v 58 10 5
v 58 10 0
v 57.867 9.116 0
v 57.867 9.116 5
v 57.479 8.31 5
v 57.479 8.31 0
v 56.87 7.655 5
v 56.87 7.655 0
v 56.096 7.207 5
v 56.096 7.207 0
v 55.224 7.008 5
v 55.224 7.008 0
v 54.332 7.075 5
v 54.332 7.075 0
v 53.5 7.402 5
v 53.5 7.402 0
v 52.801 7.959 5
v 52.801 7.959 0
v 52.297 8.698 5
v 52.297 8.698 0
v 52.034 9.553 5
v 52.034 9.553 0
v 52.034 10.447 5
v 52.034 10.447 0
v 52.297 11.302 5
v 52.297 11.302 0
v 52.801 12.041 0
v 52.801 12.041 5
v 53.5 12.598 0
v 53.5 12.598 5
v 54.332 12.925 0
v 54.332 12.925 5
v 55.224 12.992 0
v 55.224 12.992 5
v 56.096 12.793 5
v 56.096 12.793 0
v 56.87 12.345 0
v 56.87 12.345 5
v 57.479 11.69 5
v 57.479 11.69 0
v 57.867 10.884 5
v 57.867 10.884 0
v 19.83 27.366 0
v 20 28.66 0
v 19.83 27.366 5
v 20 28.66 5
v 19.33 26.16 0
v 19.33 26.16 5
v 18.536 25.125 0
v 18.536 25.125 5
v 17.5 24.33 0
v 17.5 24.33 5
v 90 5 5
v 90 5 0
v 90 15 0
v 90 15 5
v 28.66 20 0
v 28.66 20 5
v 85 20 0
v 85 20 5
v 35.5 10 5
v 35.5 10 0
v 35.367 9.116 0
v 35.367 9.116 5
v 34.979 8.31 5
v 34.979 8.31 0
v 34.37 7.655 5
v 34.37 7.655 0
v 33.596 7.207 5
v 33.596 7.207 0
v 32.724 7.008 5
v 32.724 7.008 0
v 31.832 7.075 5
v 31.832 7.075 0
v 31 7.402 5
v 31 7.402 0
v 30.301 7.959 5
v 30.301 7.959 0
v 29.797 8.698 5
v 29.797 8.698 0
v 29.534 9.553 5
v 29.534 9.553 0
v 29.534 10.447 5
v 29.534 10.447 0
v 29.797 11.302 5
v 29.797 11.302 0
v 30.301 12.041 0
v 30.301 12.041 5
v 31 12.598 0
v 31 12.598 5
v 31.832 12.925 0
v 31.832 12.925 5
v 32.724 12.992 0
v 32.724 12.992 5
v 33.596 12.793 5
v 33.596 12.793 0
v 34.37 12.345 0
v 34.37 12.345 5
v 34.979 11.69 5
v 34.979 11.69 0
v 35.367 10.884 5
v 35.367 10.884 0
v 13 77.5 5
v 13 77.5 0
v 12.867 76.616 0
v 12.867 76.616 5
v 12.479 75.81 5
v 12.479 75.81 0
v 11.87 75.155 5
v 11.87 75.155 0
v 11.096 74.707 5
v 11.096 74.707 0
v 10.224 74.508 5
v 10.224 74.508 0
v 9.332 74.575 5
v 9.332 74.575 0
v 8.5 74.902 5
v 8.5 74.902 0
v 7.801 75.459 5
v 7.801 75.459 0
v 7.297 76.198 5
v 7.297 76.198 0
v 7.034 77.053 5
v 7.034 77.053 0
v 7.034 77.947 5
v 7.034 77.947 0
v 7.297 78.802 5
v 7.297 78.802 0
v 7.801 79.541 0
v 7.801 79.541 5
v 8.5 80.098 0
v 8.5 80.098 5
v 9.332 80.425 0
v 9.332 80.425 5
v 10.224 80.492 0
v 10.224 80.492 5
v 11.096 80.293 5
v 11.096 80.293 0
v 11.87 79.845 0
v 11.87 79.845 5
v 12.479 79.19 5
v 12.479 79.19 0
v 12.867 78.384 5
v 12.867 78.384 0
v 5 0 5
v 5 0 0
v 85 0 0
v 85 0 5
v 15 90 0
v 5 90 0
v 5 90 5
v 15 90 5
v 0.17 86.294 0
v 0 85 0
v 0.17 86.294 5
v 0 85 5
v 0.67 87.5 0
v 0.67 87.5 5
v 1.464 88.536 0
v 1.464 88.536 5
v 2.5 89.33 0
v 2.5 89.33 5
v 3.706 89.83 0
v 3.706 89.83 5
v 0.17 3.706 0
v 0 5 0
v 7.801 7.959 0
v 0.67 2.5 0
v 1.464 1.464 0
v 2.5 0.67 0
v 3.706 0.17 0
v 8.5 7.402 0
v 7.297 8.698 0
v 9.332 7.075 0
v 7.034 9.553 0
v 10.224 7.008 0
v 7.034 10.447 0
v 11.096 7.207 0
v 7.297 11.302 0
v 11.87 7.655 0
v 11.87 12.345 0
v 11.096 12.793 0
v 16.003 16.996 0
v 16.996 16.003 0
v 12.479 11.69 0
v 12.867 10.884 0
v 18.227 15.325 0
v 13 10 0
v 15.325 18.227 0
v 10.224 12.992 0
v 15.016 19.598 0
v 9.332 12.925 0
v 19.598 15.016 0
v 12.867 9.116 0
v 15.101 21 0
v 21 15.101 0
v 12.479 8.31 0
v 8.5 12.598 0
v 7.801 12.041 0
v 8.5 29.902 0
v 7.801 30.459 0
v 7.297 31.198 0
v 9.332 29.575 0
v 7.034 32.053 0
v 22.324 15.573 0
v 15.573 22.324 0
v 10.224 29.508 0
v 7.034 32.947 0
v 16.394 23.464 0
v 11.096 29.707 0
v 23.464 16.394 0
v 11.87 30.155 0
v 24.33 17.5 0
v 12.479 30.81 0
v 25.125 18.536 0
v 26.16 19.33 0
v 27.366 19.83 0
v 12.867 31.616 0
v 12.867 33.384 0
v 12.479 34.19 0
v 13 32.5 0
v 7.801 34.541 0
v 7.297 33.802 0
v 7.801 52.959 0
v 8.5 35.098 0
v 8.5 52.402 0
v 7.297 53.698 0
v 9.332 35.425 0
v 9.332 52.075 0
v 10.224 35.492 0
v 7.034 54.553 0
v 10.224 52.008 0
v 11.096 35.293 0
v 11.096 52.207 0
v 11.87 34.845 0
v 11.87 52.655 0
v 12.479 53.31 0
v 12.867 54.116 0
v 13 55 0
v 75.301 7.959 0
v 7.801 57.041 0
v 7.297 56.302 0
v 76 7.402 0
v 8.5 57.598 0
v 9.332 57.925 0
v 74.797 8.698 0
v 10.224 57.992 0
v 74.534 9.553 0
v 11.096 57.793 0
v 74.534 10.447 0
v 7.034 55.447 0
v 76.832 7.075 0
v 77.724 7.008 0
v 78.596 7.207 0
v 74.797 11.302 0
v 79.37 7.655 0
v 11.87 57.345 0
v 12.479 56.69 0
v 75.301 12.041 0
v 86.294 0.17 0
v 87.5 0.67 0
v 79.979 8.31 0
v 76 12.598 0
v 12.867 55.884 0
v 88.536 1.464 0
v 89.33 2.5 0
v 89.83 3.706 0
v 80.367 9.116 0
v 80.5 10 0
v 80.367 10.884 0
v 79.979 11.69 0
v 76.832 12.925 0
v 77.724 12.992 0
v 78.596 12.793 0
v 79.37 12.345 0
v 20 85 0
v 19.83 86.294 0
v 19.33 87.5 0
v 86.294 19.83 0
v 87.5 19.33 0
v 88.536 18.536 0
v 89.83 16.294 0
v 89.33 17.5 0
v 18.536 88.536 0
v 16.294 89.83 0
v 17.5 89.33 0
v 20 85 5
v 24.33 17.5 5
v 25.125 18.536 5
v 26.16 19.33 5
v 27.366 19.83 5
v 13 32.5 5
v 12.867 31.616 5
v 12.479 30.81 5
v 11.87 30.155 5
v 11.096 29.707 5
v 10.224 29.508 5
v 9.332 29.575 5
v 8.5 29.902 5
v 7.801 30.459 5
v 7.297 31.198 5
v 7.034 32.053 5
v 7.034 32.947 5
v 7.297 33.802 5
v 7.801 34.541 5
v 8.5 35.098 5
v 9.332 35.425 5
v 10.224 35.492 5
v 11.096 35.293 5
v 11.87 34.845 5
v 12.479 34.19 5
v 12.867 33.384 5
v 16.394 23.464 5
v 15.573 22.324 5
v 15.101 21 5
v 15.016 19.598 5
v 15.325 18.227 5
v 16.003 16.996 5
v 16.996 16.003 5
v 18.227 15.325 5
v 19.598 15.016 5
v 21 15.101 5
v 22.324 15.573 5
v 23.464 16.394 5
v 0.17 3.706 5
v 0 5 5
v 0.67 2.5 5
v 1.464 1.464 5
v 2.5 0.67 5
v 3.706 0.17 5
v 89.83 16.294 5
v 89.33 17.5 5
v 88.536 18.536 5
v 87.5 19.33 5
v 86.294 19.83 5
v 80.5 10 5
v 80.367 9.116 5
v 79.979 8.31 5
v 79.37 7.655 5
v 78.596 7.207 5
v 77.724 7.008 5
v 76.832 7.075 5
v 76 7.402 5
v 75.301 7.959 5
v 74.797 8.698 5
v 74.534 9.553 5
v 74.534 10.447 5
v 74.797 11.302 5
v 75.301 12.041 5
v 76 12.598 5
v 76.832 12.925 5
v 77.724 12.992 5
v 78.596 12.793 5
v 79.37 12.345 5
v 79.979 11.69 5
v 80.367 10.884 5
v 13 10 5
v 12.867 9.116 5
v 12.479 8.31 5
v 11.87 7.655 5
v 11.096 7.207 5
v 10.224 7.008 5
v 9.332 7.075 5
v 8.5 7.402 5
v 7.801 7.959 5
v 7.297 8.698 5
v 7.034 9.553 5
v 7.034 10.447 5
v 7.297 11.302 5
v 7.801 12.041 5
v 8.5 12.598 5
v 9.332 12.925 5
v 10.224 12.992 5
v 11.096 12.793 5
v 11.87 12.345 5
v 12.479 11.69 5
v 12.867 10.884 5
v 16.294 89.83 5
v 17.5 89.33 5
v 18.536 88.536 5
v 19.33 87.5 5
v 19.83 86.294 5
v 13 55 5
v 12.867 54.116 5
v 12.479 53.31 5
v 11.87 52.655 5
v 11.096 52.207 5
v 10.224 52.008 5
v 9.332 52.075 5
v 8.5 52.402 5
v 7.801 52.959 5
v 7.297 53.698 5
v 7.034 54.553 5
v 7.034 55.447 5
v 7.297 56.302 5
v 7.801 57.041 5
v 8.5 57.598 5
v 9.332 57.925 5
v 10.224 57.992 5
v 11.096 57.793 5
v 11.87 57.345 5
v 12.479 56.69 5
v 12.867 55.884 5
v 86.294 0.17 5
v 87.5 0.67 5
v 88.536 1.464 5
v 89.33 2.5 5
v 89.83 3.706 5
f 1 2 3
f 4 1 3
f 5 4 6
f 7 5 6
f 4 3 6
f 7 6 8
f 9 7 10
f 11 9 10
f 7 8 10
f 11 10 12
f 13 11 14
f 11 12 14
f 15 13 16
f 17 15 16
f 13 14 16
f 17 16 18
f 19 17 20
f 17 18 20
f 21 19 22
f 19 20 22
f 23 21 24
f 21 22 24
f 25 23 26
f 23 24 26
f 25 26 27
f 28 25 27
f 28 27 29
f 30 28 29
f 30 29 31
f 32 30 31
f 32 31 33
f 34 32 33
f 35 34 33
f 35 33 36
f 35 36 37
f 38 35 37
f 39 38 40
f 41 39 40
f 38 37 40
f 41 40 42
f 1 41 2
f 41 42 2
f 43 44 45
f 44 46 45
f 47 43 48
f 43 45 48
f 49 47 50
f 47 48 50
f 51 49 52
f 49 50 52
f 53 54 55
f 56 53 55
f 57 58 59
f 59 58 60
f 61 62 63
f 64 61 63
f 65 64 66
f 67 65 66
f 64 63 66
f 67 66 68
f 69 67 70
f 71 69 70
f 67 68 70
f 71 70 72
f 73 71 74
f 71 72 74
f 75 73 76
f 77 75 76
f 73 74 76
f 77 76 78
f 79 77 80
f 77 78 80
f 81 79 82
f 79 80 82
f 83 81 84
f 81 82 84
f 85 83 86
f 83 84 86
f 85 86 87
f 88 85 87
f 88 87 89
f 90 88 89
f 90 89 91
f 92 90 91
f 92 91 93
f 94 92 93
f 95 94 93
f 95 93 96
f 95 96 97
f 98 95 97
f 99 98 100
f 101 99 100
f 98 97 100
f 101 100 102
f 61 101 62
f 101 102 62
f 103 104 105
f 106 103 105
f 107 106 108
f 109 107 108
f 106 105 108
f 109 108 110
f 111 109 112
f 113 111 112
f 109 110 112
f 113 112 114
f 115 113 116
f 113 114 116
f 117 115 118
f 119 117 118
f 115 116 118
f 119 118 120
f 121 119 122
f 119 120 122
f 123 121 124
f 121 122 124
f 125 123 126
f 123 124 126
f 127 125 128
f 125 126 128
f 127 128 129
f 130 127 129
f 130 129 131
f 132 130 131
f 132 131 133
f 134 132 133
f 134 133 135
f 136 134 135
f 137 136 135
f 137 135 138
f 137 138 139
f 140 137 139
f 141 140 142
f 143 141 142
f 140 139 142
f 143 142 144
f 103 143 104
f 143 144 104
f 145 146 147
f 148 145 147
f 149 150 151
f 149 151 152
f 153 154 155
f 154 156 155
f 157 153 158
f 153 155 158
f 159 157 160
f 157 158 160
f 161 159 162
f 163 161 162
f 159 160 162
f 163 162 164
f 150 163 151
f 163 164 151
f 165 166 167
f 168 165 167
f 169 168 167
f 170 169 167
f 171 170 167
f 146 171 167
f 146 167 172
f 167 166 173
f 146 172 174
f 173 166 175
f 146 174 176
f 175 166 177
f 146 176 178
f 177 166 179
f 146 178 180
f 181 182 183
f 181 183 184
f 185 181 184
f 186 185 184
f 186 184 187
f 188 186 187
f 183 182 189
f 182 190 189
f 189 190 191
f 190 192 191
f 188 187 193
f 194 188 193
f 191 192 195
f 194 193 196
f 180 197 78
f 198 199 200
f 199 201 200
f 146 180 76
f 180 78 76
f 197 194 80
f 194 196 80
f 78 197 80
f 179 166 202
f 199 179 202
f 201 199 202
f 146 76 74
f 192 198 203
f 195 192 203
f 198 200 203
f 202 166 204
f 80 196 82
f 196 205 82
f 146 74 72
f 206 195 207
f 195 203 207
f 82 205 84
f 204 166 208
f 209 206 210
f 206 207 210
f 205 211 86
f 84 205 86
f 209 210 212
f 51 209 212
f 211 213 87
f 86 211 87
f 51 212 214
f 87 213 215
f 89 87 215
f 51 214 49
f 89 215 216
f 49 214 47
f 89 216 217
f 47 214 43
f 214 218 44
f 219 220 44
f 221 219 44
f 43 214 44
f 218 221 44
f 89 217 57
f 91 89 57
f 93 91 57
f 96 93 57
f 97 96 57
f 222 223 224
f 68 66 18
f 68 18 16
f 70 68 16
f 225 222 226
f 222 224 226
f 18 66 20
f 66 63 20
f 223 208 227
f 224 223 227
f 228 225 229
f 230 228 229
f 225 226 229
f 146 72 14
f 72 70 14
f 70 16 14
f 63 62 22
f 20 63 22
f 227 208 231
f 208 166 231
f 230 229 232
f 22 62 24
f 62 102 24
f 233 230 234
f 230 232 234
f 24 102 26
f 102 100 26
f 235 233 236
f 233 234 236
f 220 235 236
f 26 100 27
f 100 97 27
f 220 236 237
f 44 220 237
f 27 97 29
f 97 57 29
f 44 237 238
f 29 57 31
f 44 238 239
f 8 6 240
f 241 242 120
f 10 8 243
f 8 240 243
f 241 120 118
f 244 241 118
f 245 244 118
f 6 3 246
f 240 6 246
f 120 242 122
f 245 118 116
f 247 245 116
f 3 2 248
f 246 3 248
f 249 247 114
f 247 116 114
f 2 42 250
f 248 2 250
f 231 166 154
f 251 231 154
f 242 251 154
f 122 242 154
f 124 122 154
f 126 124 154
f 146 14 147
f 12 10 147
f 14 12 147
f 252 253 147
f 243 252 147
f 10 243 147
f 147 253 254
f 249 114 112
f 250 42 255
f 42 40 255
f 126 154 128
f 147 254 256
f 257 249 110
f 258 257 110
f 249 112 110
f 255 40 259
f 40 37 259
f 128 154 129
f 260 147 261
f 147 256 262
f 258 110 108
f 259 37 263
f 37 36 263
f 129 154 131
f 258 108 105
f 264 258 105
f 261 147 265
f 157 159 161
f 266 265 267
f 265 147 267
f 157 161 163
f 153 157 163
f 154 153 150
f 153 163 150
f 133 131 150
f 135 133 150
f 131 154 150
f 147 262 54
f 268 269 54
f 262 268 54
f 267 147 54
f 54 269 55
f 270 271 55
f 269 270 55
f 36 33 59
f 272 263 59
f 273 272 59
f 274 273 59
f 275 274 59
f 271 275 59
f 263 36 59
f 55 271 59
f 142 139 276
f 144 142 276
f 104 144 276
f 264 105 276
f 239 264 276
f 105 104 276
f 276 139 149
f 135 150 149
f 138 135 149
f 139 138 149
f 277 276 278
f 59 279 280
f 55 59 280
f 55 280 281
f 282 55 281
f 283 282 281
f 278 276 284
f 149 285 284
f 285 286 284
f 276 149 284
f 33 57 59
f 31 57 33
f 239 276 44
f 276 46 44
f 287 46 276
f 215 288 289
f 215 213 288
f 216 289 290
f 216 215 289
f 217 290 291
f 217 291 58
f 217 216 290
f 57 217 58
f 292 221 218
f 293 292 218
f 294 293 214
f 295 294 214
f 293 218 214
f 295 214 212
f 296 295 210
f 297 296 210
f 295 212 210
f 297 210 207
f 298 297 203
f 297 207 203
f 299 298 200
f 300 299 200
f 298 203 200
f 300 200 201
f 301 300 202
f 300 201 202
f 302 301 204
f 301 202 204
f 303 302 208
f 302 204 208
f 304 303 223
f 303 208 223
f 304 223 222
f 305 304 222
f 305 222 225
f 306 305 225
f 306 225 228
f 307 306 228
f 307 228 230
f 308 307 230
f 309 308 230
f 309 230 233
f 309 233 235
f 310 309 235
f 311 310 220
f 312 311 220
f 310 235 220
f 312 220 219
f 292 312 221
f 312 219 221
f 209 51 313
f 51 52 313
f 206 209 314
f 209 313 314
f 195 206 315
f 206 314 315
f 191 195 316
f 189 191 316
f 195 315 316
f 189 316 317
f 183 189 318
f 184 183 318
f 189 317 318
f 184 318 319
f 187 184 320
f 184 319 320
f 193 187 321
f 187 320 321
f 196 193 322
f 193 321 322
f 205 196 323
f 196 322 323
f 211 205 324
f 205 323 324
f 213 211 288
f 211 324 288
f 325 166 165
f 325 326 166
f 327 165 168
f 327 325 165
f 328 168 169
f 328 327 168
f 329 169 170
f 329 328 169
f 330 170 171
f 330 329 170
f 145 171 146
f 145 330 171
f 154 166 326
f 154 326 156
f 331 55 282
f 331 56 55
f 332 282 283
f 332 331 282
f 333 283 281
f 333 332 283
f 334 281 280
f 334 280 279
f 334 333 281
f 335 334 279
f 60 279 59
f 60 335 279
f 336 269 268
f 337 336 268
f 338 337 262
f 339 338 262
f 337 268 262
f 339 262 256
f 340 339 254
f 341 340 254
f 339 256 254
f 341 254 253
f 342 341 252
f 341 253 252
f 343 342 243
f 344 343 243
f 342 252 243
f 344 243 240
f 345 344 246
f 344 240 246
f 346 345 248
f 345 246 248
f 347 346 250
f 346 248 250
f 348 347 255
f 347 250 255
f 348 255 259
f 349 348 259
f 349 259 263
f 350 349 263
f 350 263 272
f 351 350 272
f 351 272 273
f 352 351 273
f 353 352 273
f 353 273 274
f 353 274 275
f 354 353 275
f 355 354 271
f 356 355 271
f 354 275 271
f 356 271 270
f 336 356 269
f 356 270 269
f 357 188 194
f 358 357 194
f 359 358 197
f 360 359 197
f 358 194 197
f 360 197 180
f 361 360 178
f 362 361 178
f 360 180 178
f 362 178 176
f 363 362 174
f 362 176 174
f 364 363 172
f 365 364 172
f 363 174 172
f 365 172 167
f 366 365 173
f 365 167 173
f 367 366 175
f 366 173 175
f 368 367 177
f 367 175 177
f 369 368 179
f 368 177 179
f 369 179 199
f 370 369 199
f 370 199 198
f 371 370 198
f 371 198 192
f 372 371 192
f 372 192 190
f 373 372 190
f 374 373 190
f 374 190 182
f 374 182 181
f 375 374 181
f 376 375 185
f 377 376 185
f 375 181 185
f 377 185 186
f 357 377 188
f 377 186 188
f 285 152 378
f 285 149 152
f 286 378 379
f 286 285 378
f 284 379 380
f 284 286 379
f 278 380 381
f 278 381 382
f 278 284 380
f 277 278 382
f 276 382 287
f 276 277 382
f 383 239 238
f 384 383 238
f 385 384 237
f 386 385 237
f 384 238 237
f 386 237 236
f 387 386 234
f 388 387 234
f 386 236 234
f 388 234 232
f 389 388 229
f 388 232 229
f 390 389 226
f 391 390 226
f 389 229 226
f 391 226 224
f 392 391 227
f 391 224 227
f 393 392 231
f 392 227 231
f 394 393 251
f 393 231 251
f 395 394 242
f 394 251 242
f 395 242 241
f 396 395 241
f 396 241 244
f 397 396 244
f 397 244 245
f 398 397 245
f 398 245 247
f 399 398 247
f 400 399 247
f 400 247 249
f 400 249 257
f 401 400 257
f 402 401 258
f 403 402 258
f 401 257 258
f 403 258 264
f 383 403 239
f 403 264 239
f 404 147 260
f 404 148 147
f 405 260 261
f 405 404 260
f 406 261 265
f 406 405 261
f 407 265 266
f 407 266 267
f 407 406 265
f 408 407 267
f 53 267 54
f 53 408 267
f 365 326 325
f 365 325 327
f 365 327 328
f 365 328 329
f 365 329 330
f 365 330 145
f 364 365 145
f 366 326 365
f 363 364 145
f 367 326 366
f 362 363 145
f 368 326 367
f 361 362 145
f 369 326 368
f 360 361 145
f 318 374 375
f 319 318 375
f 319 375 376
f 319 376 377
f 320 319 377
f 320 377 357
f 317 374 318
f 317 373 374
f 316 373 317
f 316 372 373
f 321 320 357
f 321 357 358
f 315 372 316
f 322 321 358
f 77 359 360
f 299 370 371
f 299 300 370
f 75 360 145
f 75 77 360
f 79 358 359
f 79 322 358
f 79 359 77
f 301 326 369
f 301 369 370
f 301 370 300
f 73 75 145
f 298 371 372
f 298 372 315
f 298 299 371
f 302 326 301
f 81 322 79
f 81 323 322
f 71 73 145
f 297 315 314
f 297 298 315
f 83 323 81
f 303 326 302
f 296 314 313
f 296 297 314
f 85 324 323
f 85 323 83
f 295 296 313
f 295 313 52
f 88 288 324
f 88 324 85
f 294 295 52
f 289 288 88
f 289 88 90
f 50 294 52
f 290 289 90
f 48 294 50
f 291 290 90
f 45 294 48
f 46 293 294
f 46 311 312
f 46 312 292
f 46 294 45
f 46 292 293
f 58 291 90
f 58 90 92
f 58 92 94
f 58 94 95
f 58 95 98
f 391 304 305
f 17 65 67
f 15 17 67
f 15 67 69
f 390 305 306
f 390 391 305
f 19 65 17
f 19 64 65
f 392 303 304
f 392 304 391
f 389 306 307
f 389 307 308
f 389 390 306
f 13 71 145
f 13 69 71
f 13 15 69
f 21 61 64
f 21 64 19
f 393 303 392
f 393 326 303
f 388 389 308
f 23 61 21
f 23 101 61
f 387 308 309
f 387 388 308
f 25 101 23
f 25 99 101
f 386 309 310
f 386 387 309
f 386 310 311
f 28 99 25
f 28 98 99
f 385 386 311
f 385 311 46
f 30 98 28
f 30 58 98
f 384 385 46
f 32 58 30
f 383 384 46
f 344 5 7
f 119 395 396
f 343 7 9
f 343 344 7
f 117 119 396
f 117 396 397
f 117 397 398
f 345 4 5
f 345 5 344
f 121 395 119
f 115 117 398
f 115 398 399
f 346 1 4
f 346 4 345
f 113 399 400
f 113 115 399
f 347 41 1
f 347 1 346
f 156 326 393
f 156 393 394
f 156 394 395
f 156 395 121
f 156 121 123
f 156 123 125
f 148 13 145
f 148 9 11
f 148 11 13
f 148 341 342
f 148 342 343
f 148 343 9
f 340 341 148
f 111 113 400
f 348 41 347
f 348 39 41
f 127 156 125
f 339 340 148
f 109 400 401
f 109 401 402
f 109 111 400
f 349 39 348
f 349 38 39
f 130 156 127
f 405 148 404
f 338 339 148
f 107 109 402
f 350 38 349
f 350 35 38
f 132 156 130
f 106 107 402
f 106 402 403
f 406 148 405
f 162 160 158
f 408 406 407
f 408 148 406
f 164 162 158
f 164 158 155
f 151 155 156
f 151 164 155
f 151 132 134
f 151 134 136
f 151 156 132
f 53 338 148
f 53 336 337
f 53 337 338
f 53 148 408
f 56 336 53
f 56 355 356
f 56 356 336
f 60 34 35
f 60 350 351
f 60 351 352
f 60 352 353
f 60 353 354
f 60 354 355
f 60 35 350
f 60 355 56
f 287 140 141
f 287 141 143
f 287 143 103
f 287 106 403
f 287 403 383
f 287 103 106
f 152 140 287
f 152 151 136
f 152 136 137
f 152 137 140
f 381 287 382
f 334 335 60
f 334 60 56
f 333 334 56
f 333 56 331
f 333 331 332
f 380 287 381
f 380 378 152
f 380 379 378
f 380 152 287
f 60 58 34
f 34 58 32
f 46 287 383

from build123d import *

# Parameters (mm, degrees)
SKETCH_W        = 90
SKETCH_H        = 90
PAD_DEPTH       = 5
SKETCH001_W     = 90
SKETCH001_H     = 90
POCKET_DEPTH    = 5
SKETCH002_R     = 5
POCKET001_DEPTH = 5
FILLET_R        = 5
SKETCH003_R     = 3
POCKET002_DEPTH = 5


with BuildPart() as part:
    # Sketch → Pad (new body)
    with BuildSketch(Plane.XY):
        with Locations((45, 45)):
            Rectangle(SKETCH_W, SKETCH_H)
    extrude(amount=PAD_DEPTH)

    # Sketch001 (on Face6 of Pad) → Pocket (cut)
    with BuildSketch(Plane.XY.offset(5)):
        with Locations((65, 65)):
            Rectangle(SKETCH001_W, SKETCH001_H)
    extrude(amount=-POCKET_DEPTH, mode=Mode.SUBTRACT)

    # Sketch002 (on Face4 of Pocket) → Pocket001 (cut)
    with BuildSketch(Plane.XY.offset(5)):
        with Locations((20, 20)):
            Circle(SKETCH002_R)
    extrude(amount=-POCKET001_DEPTH, mode=Mode.SUBTRACT)

    # Fillet
    fillet_edges = [part.edges().sort_by_distance(p)[0] for p in [
        (20, 25, 2.5),
        (25, 20, 2.5),
        (0, 0, 2.5),
        (90, 20, 2.5),
        (90, 0, 2.5),
        (20, 90, 2.5),
        (0, 90, 2.5),
    ]]
    fillet(fillet_edges, radius=FILLET_R)

    # Sketch003 (on Face2 of Fillet) → Pocket002 (cut)
    with BuildSketch(Plane(origin=(0, 0, 0), x_dir=(1, 0, 0), z_dir=(0, 0, -1))):
        with Locations((32.5, -10)):
            Circle(SKETCH003_R)
        with Locations((55, -10)):
            Circle(SKETCH003_R)
        with Locations((77.5, -10)):
            Circle(SKETCH003_R)
        with Locations((10, -32.5)):
            Circle(SKETCH003_R)
        with Locations((10, -55)):
            Circle(SKETCH003_R)
        with Locations((10, -77.5)):
            Circle(SKETCH003_R)
        with Locations((10, -10)):
            Circle(SKETCH003_R)
    extrude(amount=-POCKET002_DEPTH, mode=Mode.SUBTRACT)


solid = part.part
